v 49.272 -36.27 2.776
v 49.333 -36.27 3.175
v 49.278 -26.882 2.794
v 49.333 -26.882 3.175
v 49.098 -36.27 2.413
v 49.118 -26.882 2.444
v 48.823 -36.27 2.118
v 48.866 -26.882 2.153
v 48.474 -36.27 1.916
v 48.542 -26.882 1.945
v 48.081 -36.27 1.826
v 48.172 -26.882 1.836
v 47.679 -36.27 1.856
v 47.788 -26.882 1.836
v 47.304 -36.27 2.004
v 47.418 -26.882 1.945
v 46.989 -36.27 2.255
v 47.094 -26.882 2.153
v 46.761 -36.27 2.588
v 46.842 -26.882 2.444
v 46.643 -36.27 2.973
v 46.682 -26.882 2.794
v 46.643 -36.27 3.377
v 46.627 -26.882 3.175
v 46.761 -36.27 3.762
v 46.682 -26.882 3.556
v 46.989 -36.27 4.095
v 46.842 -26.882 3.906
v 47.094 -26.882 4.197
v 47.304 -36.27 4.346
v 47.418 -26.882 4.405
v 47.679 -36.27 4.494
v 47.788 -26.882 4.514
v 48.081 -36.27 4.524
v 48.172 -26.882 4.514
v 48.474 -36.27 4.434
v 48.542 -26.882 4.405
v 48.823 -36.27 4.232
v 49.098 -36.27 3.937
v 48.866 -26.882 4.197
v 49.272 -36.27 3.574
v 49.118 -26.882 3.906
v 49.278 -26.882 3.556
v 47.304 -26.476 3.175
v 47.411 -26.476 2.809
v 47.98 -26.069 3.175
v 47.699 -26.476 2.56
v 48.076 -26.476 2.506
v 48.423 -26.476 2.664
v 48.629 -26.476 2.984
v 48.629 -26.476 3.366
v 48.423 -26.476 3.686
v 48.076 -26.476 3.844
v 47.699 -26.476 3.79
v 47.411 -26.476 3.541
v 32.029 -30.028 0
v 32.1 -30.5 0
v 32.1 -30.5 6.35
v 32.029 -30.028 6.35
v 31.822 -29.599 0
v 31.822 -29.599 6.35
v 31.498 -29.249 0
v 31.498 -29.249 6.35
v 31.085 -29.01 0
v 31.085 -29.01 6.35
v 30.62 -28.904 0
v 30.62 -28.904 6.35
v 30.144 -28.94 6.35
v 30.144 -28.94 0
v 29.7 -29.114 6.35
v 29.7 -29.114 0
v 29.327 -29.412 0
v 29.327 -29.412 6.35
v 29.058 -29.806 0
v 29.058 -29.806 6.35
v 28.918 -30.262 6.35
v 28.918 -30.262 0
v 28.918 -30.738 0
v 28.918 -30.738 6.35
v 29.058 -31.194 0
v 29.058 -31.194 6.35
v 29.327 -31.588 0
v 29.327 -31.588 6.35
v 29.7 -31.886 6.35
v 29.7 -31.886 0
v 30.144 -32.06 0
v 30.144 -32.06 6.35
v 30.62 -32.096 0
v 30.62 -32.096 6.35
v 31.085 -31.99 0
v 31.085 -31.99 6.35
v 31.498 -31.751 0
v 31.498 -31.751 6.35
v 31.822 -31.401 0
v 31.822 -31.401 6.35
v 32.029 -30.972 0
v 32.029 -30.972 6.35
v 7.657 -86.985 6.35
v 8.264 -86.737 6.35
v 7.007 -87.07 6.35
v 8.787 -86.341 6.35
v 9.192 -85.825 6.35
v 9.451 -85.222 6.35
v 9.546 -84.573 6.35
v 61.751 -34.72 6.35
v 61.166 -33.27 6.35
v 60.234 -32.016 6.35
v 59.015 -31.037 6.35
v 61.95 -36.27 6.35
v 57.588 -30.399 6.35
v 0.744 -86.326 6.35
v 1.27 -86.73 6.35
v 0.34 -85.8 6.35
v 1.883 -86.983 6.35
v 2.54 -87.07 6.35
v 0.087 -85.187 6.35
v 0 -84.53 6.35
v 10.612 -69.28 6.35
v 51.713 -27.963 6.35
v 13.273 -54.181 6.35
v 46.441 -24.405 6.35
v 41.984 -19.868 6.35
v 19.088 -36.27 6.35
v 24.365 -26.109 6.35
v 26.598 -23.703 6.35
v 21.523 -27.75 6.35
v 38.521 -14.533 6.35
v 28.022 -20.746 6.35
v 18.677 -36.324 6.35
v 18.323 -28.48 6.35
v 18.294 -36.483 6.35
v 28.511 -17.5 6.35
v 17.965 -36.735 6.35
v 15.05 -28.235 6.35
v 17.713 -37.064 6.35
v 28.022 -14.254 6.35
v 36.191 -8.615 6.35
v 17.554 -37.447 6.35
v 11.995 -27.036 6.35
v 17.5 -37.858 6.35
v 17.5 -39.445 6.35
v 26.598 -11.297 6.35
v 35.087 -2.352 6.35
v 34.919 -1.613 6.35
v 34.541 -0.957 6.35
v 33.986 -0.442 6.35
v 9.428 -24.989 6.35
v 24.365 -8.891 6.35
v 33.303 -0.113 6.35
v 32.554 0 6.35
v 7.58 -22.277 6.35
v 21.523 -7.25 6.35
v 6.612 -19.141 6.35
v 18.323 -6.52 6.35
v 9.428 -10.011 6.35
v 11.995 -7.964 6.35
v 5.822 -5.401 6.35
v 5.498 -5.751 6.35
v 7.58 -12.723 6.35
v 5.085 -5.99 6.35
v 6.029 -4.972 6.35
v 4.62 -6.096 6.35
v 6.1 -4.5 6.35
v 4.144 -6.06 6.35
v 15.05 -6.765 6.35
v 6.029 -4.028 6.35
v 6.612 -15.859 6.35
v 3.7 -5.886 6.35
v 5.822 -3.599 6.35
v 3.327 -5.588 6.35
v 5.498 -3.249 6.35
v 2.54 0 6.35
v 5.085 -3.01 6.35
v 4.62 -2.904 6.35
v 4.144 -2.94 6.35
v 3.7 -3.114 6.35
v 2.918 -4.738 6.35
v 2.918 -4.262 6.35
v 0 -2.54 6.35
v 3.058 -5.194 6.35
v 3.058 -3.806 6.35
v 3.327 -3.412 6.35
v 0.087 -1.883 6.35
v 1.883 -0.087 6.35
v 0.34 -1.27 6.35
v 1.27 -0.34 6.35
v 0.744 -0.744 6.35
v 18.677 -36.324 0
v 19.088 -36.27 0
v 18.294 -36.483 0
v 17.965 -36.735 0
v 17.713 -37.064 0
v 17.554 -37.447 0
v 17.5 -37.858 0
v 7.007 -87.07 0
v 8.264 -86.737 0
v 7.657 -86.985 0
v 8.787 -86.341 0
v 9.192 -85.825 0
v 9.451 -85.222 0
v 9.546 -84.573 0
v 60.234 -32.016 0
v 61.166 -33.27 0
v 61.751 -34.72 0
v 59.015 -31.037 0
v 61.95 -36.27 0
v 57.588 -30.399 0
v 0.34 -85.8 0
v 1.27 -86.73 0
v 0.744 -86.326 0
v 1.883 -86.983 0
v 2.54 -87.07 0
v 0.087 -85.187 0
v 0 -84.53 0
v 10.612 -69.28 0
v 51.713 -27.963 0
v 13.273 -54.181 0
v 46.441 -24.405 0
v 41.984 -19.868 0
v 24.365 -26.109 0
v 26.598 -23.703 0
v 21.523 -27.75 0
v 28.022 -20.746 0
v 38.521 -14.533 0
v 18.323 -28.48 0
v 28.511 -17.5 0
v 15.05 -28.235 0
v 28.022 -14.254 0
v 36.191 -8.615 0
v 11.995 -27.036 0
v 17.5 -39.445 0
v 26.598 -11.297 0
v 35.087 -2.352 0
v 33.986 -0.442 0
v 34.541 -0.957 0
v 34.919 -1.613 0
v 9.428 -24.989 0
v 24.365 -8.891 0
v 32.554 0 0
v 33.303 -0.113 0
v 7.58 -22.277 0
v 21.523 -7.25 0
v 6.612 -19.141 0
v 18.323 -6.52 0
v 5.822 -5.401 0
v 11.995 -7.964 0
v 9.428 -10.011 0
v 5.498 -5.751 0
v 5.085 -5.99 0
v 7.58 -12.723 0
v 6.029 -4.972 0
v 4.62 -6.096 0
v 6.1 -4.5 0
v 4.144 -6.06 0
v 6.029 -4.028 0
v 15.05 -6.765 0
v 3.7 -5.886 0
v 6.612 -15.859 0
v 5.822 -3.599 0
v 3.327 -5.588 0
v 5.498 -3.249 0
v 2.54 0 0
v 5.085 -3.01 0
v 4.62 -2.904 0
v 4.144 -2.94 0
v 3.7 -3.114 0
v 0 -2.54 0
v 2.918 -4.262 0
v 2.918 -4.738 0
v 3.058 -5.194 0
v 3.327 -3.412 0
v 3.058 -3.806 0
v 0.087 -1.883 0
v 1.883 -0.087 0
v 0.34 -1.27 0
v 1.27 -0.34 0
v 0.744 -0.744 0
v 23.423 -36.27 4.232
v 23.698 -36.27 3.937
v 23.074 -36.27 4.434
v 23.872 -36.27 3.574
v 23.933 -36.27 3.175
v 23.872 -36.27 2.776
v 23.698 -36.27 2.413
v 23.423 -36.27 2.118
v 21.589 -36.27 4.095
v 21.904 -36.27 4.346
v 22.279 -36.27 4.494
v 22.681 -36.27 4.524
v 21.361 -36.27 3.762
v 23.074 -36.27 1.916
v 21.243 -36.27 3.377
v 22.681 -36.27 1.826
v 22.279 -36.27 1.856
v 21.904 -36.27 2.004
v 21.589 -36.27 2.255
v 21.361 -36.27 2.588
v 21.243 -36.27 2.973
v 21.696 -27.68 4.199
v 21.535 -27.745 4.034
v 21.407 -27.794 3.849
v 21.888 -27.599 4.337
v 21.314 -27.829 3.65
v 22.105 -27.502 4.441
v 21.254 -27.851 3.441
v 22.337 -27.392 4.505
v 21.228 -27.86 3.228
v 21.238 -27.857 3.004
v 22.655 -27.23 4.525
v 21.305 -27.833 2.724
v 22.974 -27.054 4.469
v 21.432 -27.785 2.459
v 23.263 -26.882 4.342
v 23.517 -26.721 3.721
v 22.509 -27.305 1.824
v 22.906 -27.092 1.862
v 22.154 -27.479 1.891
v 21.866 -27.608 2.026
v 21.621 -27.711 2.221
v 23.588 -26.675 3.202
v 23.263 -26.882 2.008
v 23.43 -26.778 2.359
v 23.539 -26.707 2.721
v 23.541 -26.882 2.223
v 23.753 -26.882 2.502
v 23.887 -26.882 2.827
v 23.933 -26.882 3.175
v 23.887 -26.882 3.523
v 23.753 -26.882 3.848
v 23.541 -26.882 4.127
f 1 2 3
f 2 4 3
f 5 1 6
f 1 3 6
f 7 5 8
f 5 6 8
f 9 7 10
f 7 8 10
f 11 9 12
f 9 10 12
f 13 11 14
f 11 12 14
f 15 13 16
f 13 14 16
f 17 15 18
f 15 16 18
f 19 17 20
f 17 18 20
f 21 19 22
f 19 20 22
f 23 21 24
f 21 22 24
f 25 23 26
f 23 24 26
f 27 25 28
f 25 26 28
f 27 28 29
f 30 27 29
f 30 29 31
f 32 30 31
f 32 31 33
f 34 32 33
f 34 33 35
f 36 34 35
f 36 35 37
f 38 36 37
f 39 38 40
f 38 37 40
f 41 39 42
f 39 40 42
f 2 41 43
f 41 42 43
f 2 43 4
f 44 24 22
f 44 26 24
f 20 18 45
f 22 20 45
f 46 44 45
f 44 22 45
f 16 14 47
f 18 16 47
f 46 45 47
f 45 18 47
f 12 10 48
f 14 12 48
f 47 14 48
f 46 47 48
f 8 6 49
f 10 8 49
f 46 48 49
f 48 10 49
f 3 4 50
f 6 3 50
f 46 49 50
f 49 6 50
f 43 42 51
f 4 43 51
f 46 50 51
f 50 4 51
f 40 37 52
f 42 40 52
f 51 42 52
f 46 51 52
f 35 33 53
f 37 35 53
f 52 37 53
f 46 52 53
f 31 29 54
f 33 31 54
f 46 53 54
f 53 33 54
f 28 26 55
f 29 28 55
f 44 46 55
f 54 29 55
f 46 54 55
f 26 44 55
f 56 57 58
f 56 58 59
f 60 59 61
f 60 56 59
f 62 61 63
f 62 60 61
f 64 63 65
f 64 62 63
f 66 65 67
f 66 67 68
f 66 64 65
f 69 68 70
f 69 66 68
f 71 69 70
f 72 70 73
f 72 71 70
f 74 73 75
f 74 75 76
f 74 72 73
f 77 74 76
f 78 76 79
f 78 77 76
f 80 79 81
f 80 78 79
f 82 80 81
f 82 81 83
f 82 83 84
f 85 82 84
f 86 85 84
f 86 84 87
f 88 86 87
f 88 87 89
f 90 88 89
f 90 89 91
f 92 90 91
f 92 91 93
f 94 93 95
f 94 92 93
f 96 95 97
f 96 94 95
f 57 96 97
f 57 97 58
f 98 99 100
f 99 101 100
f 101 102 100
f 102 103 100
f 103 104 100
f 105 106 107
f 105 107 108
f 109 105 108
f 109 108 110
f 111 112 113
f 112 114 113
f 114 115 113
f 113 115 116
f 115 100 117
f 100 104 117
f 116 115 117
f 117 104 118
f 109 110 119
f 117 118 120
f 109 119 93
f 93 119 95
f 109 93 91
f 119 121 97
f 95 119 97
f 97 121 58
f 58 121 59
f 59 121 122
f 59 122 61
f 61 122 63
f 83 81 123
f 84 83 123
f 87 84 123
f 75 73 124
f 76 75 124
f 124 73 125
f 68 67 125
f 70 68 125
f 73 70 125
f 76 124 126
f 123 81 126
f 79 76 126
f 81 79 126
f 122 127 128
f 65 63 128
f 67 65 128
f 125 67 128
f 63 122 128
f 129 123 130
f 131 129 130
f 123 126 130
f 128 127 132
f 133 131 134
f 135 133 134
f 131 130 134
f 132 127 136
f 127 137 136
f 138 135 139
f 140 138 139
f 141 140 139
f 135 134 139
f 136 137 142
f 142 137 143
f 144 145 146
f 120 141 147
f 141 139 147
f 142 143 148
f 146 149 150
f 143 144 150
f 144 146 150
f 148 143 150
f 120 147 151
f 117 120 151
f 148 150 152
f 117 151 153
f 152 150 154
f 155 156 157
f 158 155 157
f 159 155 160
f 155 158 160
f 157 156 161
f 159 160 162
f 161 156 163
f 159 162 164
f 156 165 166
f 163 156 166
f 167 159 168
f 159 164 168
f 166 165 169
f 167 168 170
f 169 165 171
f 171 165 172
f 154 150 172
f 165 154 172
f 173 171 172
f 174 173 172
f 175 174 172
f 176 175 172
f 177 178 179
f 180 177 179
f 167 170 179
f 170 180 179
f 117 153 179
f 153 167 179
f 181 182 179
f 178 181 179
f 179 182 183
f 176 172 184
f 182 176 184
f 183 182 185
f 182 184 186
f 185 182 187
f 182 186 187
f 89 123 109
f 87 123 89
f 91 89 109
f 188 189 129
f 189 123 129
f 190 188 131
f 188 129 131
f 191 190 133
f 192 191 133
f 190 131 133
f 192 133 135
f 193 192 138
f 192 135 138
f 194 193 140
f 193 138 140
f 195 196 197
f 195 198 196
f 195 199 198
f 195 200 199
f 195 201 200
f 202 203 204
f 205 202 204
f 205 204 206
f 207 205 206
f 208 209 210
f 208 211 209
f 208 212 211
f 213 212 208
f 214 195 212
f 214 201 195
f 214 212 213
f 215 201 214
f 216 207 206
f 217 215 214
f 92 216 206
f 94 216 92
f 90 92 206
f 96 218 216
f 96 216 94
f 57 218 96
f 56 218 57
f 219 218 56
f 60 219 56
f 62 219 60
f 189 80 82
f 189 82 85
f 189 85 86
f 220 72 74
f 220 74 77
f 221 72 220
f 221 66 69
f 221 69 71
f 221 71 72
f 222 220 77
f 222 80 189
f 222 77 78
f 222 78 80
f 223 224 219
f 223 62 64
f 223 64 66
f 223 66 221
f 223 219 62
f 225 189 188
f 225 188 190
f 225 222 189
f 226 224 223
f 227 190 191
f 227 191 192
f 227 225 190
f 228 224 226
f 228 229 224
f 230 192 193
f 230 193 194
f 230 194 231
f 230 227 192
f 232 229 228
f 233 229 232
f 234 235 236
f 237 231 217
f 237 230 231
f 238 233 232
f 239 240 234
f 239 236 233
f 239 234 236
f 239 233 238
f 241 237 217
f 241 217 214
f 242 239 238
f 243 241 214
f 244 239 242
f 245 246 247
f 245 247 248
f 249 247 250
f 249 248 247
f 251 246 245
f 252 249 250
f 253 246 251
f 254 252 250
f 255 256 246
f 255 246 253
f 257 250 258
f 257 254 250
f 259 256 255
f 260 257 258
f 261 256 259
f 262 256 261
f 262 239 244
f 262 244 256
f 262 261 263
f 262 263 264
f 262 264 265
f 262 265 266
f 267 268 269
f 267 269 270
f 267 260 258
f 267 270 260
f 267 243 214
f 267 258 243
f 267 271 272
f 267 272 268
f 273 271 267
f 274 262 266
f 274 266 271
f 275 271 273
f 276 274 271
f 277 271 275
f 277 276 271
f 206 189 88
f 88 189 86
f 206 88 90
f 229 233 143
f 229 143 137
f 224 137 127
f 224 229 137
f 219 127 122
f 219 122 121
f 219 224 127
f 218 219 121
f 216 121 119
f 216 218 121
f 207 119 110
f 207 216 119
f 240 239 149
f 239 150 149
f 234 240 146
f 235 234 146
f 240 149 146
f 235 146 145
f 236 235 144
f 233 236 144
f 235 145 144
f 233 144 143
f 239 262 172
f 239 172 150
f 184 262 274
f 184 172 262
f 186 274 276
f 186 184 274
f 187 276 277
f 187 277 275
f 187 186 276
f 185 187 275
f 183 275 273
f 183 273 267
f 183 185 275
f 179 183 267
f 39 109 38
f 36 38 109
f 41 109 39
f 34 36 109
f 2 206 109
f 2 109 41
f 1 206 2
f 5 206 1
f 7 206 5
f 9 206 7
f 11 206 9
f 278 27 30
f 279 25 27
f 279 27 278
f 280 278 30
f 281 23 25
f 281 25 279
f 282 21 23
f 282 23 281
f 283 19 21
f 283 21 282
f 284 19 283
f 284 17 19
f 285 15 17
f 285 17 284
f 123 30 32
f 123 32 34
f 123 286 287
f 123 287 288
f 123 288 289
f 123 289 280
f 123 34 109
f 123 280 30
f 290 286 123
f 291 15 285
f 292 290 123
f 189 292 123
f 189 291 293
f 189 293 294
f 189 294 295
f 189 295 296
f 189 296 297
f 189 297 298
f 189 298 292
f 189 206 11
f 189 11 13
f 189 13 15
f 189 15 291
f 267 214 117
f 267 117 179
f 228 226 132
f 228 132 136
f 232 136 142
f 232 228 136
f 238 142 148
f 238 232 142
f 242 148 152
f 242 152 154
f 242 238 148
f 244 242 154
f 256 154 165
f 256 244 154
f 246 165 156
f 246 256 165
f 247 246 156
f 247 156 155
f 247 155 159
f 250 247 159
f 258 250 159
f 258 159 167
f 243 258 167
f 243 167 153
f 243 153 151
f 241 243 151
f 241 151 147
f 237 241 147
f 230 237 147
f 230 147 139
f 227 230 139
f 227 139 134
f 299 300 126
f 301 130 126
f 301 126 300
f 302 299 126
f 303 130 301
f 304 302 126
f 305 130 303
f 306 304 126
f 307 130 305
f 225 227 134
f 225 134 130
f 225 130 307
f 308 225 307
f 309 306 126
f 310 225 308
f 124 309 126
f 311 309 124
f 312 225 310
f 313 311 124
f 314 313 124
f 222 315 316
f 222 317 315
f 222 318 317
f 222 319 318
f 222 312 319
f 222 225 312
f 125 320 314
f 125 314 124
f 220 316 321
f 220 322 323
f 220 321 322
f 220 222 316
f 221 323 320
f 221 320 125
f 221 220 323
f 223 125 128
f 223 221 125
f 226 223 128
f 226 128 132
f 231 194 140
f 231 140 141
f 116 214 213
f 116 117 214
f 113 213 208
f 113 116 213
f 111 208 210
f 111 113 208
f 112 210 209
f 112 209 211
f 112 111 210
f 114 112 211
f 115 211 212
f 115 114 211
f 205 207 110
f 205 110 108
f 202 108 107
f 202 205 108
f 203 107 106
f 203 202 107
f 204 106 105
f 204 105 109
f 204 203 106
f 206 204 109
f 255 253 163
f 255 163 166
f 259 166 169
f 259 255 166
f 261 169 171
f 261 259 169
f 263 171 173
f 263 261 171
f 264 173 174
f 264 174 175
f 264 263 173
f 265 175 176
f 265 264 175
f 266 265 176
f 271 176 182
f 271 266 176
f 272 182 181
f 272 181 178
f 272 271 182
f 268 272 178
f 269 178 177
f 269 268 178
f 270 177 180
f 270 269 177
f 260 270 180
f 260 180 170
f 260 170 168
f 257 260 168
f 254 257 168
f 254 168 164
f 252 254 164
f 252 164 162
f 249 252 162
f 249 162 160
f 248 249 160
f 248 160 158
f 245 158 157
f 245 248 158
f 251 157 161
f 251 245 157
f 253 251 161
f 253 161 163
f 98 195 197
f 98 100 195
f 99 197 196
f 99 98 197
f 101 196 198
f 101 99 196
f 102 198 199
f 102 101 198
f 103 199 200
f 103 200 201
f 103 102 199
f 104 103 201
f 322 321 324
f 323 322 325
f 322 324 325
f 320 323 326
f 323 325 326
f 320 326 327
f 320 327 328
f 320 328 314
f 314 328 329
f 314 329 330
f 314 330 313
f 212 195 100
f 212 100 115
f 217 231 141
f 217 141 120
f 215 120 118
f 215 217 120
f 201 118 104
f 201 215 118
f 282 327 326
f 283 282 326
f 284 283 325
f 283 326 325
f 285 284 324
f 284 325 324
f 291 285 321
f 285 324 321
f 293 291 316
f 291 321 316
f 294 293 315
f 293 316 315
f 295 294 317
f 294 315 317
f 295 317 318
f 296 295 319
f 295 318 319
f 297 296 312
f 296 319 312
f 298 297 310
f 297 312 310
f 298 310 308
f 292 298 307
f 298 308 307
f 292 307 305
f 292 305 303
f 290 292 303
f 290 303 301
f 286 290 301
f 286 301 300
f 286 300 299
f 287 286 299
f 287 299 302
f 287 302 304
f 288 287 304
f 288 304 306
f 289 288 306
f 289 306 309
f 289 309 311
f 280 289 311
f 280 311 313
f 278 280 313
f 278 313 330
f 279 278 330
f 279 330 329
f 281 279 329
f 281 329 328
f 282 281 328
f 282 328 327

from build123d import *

# Parameters (mm, degrees)
SKETCH1_R                 = 1.6002
SKETCH1_R_2               = 11.0109
BOSS_EXTRUDE1_DEPTH       = 6.35
FILLET1_R                 = 2.54
F_6_32_TAPPED_HOLE1_D     = 2.7051
F_6_32_TAPPED_HOLE1_DEPTH = 9.38784
F_6_32_TAPPED_HOLE1_TIP   = 0.81269403
FILLET2_R                 = 1.5875


with BuildPart() as part:
    # Sketch1 → Boss-Extrude1 (new body)
    with BuildSketch(Plane.XY):
        with BuildLine():
            Line((0, 0), (35, 0))
            ThreePointArc((35, 0), (41.265093292, -18.936262305), (57.587844415, -30.399299417))
            ThreePointArc((57.587844415, -30.399299417), (60.74008766, -32.613036613), (61.95, -36.270000104))
            Line((61.95, -36.270000104), (17.5, -36.270000104))
            Line((17.5, -36.270000104), (17.5, -39.445000104))
            ThreePointArc((17.5, -39.445000104), (11.532534029, -62.925946747), (9.525, -87.070000104))
            Line((9.525, -87.070000104), (0, -87.070000104))
            Line((0, -87.070000104), (0, -36.270000104))
            Line((0, -36.270000104), (0, 0))
        make_face()
        with Locations((4.5, -4.5)):
            Circle(SKETCH1_R, mode=Mode.SUBTRACT)
        with Locations((17.5, -17.5)):
            Circle(SKETCH1_R_2, mode=Mode.SUBTRACT)
        with Locations((30.5, -30.5)):
            Circle(SKETCH1_R, mode=Mode.SUBTRACT)
    extrude(amount=BOSS_EXTRUDE1_DEPTH)

    # Fillet1
    fillet1_edges = [part.edges().sort_by_distance(p)[0] for p in [
        (0, 0, 3.175),
        (35, 0, 3.175),
        (9.525, -87.070000104, 3.175),
        (0, -87.070000104, 3.175),
    ]]
    fillet(fillet1_edges, radius=FILLET1_R)

    # #6-32 Tapped Hole1
    with Locations(Plane(origin=(0, -36.270000104, 0), x_dir=(-1, 0, 0), z_dir=(0, -1, 0))):
        with Locations((-22.58, -3.175), (-47.98, -3.175)):
            Hole(F_6_32_TAPPED_HOLE1_D / 2, depth=F_6_32_TAPPED_HOLE1_DEPTH)
            with Locations((0, 0, -(F_6_32_TAPPED_HOLE1_DEPTH + F_6_32_TAPPED_HOLE1_TIP / 2))):  # 118° drill point
                Cone(0, F_6_32_TAPPED_HOLE1_D / 2, F_6_32_TAPPED_HOLE1_TIP, mode=Mode.SUBTRACT)

    # Fillet2
    fillet2_edges = [part.edges().sort_by_distance(p)[0] for p in [
        (17.5, -36.270000104, 3.175),
    ]]
    fillet(fillet2_edges, radius=FILLET2_R)


solid = part.part
